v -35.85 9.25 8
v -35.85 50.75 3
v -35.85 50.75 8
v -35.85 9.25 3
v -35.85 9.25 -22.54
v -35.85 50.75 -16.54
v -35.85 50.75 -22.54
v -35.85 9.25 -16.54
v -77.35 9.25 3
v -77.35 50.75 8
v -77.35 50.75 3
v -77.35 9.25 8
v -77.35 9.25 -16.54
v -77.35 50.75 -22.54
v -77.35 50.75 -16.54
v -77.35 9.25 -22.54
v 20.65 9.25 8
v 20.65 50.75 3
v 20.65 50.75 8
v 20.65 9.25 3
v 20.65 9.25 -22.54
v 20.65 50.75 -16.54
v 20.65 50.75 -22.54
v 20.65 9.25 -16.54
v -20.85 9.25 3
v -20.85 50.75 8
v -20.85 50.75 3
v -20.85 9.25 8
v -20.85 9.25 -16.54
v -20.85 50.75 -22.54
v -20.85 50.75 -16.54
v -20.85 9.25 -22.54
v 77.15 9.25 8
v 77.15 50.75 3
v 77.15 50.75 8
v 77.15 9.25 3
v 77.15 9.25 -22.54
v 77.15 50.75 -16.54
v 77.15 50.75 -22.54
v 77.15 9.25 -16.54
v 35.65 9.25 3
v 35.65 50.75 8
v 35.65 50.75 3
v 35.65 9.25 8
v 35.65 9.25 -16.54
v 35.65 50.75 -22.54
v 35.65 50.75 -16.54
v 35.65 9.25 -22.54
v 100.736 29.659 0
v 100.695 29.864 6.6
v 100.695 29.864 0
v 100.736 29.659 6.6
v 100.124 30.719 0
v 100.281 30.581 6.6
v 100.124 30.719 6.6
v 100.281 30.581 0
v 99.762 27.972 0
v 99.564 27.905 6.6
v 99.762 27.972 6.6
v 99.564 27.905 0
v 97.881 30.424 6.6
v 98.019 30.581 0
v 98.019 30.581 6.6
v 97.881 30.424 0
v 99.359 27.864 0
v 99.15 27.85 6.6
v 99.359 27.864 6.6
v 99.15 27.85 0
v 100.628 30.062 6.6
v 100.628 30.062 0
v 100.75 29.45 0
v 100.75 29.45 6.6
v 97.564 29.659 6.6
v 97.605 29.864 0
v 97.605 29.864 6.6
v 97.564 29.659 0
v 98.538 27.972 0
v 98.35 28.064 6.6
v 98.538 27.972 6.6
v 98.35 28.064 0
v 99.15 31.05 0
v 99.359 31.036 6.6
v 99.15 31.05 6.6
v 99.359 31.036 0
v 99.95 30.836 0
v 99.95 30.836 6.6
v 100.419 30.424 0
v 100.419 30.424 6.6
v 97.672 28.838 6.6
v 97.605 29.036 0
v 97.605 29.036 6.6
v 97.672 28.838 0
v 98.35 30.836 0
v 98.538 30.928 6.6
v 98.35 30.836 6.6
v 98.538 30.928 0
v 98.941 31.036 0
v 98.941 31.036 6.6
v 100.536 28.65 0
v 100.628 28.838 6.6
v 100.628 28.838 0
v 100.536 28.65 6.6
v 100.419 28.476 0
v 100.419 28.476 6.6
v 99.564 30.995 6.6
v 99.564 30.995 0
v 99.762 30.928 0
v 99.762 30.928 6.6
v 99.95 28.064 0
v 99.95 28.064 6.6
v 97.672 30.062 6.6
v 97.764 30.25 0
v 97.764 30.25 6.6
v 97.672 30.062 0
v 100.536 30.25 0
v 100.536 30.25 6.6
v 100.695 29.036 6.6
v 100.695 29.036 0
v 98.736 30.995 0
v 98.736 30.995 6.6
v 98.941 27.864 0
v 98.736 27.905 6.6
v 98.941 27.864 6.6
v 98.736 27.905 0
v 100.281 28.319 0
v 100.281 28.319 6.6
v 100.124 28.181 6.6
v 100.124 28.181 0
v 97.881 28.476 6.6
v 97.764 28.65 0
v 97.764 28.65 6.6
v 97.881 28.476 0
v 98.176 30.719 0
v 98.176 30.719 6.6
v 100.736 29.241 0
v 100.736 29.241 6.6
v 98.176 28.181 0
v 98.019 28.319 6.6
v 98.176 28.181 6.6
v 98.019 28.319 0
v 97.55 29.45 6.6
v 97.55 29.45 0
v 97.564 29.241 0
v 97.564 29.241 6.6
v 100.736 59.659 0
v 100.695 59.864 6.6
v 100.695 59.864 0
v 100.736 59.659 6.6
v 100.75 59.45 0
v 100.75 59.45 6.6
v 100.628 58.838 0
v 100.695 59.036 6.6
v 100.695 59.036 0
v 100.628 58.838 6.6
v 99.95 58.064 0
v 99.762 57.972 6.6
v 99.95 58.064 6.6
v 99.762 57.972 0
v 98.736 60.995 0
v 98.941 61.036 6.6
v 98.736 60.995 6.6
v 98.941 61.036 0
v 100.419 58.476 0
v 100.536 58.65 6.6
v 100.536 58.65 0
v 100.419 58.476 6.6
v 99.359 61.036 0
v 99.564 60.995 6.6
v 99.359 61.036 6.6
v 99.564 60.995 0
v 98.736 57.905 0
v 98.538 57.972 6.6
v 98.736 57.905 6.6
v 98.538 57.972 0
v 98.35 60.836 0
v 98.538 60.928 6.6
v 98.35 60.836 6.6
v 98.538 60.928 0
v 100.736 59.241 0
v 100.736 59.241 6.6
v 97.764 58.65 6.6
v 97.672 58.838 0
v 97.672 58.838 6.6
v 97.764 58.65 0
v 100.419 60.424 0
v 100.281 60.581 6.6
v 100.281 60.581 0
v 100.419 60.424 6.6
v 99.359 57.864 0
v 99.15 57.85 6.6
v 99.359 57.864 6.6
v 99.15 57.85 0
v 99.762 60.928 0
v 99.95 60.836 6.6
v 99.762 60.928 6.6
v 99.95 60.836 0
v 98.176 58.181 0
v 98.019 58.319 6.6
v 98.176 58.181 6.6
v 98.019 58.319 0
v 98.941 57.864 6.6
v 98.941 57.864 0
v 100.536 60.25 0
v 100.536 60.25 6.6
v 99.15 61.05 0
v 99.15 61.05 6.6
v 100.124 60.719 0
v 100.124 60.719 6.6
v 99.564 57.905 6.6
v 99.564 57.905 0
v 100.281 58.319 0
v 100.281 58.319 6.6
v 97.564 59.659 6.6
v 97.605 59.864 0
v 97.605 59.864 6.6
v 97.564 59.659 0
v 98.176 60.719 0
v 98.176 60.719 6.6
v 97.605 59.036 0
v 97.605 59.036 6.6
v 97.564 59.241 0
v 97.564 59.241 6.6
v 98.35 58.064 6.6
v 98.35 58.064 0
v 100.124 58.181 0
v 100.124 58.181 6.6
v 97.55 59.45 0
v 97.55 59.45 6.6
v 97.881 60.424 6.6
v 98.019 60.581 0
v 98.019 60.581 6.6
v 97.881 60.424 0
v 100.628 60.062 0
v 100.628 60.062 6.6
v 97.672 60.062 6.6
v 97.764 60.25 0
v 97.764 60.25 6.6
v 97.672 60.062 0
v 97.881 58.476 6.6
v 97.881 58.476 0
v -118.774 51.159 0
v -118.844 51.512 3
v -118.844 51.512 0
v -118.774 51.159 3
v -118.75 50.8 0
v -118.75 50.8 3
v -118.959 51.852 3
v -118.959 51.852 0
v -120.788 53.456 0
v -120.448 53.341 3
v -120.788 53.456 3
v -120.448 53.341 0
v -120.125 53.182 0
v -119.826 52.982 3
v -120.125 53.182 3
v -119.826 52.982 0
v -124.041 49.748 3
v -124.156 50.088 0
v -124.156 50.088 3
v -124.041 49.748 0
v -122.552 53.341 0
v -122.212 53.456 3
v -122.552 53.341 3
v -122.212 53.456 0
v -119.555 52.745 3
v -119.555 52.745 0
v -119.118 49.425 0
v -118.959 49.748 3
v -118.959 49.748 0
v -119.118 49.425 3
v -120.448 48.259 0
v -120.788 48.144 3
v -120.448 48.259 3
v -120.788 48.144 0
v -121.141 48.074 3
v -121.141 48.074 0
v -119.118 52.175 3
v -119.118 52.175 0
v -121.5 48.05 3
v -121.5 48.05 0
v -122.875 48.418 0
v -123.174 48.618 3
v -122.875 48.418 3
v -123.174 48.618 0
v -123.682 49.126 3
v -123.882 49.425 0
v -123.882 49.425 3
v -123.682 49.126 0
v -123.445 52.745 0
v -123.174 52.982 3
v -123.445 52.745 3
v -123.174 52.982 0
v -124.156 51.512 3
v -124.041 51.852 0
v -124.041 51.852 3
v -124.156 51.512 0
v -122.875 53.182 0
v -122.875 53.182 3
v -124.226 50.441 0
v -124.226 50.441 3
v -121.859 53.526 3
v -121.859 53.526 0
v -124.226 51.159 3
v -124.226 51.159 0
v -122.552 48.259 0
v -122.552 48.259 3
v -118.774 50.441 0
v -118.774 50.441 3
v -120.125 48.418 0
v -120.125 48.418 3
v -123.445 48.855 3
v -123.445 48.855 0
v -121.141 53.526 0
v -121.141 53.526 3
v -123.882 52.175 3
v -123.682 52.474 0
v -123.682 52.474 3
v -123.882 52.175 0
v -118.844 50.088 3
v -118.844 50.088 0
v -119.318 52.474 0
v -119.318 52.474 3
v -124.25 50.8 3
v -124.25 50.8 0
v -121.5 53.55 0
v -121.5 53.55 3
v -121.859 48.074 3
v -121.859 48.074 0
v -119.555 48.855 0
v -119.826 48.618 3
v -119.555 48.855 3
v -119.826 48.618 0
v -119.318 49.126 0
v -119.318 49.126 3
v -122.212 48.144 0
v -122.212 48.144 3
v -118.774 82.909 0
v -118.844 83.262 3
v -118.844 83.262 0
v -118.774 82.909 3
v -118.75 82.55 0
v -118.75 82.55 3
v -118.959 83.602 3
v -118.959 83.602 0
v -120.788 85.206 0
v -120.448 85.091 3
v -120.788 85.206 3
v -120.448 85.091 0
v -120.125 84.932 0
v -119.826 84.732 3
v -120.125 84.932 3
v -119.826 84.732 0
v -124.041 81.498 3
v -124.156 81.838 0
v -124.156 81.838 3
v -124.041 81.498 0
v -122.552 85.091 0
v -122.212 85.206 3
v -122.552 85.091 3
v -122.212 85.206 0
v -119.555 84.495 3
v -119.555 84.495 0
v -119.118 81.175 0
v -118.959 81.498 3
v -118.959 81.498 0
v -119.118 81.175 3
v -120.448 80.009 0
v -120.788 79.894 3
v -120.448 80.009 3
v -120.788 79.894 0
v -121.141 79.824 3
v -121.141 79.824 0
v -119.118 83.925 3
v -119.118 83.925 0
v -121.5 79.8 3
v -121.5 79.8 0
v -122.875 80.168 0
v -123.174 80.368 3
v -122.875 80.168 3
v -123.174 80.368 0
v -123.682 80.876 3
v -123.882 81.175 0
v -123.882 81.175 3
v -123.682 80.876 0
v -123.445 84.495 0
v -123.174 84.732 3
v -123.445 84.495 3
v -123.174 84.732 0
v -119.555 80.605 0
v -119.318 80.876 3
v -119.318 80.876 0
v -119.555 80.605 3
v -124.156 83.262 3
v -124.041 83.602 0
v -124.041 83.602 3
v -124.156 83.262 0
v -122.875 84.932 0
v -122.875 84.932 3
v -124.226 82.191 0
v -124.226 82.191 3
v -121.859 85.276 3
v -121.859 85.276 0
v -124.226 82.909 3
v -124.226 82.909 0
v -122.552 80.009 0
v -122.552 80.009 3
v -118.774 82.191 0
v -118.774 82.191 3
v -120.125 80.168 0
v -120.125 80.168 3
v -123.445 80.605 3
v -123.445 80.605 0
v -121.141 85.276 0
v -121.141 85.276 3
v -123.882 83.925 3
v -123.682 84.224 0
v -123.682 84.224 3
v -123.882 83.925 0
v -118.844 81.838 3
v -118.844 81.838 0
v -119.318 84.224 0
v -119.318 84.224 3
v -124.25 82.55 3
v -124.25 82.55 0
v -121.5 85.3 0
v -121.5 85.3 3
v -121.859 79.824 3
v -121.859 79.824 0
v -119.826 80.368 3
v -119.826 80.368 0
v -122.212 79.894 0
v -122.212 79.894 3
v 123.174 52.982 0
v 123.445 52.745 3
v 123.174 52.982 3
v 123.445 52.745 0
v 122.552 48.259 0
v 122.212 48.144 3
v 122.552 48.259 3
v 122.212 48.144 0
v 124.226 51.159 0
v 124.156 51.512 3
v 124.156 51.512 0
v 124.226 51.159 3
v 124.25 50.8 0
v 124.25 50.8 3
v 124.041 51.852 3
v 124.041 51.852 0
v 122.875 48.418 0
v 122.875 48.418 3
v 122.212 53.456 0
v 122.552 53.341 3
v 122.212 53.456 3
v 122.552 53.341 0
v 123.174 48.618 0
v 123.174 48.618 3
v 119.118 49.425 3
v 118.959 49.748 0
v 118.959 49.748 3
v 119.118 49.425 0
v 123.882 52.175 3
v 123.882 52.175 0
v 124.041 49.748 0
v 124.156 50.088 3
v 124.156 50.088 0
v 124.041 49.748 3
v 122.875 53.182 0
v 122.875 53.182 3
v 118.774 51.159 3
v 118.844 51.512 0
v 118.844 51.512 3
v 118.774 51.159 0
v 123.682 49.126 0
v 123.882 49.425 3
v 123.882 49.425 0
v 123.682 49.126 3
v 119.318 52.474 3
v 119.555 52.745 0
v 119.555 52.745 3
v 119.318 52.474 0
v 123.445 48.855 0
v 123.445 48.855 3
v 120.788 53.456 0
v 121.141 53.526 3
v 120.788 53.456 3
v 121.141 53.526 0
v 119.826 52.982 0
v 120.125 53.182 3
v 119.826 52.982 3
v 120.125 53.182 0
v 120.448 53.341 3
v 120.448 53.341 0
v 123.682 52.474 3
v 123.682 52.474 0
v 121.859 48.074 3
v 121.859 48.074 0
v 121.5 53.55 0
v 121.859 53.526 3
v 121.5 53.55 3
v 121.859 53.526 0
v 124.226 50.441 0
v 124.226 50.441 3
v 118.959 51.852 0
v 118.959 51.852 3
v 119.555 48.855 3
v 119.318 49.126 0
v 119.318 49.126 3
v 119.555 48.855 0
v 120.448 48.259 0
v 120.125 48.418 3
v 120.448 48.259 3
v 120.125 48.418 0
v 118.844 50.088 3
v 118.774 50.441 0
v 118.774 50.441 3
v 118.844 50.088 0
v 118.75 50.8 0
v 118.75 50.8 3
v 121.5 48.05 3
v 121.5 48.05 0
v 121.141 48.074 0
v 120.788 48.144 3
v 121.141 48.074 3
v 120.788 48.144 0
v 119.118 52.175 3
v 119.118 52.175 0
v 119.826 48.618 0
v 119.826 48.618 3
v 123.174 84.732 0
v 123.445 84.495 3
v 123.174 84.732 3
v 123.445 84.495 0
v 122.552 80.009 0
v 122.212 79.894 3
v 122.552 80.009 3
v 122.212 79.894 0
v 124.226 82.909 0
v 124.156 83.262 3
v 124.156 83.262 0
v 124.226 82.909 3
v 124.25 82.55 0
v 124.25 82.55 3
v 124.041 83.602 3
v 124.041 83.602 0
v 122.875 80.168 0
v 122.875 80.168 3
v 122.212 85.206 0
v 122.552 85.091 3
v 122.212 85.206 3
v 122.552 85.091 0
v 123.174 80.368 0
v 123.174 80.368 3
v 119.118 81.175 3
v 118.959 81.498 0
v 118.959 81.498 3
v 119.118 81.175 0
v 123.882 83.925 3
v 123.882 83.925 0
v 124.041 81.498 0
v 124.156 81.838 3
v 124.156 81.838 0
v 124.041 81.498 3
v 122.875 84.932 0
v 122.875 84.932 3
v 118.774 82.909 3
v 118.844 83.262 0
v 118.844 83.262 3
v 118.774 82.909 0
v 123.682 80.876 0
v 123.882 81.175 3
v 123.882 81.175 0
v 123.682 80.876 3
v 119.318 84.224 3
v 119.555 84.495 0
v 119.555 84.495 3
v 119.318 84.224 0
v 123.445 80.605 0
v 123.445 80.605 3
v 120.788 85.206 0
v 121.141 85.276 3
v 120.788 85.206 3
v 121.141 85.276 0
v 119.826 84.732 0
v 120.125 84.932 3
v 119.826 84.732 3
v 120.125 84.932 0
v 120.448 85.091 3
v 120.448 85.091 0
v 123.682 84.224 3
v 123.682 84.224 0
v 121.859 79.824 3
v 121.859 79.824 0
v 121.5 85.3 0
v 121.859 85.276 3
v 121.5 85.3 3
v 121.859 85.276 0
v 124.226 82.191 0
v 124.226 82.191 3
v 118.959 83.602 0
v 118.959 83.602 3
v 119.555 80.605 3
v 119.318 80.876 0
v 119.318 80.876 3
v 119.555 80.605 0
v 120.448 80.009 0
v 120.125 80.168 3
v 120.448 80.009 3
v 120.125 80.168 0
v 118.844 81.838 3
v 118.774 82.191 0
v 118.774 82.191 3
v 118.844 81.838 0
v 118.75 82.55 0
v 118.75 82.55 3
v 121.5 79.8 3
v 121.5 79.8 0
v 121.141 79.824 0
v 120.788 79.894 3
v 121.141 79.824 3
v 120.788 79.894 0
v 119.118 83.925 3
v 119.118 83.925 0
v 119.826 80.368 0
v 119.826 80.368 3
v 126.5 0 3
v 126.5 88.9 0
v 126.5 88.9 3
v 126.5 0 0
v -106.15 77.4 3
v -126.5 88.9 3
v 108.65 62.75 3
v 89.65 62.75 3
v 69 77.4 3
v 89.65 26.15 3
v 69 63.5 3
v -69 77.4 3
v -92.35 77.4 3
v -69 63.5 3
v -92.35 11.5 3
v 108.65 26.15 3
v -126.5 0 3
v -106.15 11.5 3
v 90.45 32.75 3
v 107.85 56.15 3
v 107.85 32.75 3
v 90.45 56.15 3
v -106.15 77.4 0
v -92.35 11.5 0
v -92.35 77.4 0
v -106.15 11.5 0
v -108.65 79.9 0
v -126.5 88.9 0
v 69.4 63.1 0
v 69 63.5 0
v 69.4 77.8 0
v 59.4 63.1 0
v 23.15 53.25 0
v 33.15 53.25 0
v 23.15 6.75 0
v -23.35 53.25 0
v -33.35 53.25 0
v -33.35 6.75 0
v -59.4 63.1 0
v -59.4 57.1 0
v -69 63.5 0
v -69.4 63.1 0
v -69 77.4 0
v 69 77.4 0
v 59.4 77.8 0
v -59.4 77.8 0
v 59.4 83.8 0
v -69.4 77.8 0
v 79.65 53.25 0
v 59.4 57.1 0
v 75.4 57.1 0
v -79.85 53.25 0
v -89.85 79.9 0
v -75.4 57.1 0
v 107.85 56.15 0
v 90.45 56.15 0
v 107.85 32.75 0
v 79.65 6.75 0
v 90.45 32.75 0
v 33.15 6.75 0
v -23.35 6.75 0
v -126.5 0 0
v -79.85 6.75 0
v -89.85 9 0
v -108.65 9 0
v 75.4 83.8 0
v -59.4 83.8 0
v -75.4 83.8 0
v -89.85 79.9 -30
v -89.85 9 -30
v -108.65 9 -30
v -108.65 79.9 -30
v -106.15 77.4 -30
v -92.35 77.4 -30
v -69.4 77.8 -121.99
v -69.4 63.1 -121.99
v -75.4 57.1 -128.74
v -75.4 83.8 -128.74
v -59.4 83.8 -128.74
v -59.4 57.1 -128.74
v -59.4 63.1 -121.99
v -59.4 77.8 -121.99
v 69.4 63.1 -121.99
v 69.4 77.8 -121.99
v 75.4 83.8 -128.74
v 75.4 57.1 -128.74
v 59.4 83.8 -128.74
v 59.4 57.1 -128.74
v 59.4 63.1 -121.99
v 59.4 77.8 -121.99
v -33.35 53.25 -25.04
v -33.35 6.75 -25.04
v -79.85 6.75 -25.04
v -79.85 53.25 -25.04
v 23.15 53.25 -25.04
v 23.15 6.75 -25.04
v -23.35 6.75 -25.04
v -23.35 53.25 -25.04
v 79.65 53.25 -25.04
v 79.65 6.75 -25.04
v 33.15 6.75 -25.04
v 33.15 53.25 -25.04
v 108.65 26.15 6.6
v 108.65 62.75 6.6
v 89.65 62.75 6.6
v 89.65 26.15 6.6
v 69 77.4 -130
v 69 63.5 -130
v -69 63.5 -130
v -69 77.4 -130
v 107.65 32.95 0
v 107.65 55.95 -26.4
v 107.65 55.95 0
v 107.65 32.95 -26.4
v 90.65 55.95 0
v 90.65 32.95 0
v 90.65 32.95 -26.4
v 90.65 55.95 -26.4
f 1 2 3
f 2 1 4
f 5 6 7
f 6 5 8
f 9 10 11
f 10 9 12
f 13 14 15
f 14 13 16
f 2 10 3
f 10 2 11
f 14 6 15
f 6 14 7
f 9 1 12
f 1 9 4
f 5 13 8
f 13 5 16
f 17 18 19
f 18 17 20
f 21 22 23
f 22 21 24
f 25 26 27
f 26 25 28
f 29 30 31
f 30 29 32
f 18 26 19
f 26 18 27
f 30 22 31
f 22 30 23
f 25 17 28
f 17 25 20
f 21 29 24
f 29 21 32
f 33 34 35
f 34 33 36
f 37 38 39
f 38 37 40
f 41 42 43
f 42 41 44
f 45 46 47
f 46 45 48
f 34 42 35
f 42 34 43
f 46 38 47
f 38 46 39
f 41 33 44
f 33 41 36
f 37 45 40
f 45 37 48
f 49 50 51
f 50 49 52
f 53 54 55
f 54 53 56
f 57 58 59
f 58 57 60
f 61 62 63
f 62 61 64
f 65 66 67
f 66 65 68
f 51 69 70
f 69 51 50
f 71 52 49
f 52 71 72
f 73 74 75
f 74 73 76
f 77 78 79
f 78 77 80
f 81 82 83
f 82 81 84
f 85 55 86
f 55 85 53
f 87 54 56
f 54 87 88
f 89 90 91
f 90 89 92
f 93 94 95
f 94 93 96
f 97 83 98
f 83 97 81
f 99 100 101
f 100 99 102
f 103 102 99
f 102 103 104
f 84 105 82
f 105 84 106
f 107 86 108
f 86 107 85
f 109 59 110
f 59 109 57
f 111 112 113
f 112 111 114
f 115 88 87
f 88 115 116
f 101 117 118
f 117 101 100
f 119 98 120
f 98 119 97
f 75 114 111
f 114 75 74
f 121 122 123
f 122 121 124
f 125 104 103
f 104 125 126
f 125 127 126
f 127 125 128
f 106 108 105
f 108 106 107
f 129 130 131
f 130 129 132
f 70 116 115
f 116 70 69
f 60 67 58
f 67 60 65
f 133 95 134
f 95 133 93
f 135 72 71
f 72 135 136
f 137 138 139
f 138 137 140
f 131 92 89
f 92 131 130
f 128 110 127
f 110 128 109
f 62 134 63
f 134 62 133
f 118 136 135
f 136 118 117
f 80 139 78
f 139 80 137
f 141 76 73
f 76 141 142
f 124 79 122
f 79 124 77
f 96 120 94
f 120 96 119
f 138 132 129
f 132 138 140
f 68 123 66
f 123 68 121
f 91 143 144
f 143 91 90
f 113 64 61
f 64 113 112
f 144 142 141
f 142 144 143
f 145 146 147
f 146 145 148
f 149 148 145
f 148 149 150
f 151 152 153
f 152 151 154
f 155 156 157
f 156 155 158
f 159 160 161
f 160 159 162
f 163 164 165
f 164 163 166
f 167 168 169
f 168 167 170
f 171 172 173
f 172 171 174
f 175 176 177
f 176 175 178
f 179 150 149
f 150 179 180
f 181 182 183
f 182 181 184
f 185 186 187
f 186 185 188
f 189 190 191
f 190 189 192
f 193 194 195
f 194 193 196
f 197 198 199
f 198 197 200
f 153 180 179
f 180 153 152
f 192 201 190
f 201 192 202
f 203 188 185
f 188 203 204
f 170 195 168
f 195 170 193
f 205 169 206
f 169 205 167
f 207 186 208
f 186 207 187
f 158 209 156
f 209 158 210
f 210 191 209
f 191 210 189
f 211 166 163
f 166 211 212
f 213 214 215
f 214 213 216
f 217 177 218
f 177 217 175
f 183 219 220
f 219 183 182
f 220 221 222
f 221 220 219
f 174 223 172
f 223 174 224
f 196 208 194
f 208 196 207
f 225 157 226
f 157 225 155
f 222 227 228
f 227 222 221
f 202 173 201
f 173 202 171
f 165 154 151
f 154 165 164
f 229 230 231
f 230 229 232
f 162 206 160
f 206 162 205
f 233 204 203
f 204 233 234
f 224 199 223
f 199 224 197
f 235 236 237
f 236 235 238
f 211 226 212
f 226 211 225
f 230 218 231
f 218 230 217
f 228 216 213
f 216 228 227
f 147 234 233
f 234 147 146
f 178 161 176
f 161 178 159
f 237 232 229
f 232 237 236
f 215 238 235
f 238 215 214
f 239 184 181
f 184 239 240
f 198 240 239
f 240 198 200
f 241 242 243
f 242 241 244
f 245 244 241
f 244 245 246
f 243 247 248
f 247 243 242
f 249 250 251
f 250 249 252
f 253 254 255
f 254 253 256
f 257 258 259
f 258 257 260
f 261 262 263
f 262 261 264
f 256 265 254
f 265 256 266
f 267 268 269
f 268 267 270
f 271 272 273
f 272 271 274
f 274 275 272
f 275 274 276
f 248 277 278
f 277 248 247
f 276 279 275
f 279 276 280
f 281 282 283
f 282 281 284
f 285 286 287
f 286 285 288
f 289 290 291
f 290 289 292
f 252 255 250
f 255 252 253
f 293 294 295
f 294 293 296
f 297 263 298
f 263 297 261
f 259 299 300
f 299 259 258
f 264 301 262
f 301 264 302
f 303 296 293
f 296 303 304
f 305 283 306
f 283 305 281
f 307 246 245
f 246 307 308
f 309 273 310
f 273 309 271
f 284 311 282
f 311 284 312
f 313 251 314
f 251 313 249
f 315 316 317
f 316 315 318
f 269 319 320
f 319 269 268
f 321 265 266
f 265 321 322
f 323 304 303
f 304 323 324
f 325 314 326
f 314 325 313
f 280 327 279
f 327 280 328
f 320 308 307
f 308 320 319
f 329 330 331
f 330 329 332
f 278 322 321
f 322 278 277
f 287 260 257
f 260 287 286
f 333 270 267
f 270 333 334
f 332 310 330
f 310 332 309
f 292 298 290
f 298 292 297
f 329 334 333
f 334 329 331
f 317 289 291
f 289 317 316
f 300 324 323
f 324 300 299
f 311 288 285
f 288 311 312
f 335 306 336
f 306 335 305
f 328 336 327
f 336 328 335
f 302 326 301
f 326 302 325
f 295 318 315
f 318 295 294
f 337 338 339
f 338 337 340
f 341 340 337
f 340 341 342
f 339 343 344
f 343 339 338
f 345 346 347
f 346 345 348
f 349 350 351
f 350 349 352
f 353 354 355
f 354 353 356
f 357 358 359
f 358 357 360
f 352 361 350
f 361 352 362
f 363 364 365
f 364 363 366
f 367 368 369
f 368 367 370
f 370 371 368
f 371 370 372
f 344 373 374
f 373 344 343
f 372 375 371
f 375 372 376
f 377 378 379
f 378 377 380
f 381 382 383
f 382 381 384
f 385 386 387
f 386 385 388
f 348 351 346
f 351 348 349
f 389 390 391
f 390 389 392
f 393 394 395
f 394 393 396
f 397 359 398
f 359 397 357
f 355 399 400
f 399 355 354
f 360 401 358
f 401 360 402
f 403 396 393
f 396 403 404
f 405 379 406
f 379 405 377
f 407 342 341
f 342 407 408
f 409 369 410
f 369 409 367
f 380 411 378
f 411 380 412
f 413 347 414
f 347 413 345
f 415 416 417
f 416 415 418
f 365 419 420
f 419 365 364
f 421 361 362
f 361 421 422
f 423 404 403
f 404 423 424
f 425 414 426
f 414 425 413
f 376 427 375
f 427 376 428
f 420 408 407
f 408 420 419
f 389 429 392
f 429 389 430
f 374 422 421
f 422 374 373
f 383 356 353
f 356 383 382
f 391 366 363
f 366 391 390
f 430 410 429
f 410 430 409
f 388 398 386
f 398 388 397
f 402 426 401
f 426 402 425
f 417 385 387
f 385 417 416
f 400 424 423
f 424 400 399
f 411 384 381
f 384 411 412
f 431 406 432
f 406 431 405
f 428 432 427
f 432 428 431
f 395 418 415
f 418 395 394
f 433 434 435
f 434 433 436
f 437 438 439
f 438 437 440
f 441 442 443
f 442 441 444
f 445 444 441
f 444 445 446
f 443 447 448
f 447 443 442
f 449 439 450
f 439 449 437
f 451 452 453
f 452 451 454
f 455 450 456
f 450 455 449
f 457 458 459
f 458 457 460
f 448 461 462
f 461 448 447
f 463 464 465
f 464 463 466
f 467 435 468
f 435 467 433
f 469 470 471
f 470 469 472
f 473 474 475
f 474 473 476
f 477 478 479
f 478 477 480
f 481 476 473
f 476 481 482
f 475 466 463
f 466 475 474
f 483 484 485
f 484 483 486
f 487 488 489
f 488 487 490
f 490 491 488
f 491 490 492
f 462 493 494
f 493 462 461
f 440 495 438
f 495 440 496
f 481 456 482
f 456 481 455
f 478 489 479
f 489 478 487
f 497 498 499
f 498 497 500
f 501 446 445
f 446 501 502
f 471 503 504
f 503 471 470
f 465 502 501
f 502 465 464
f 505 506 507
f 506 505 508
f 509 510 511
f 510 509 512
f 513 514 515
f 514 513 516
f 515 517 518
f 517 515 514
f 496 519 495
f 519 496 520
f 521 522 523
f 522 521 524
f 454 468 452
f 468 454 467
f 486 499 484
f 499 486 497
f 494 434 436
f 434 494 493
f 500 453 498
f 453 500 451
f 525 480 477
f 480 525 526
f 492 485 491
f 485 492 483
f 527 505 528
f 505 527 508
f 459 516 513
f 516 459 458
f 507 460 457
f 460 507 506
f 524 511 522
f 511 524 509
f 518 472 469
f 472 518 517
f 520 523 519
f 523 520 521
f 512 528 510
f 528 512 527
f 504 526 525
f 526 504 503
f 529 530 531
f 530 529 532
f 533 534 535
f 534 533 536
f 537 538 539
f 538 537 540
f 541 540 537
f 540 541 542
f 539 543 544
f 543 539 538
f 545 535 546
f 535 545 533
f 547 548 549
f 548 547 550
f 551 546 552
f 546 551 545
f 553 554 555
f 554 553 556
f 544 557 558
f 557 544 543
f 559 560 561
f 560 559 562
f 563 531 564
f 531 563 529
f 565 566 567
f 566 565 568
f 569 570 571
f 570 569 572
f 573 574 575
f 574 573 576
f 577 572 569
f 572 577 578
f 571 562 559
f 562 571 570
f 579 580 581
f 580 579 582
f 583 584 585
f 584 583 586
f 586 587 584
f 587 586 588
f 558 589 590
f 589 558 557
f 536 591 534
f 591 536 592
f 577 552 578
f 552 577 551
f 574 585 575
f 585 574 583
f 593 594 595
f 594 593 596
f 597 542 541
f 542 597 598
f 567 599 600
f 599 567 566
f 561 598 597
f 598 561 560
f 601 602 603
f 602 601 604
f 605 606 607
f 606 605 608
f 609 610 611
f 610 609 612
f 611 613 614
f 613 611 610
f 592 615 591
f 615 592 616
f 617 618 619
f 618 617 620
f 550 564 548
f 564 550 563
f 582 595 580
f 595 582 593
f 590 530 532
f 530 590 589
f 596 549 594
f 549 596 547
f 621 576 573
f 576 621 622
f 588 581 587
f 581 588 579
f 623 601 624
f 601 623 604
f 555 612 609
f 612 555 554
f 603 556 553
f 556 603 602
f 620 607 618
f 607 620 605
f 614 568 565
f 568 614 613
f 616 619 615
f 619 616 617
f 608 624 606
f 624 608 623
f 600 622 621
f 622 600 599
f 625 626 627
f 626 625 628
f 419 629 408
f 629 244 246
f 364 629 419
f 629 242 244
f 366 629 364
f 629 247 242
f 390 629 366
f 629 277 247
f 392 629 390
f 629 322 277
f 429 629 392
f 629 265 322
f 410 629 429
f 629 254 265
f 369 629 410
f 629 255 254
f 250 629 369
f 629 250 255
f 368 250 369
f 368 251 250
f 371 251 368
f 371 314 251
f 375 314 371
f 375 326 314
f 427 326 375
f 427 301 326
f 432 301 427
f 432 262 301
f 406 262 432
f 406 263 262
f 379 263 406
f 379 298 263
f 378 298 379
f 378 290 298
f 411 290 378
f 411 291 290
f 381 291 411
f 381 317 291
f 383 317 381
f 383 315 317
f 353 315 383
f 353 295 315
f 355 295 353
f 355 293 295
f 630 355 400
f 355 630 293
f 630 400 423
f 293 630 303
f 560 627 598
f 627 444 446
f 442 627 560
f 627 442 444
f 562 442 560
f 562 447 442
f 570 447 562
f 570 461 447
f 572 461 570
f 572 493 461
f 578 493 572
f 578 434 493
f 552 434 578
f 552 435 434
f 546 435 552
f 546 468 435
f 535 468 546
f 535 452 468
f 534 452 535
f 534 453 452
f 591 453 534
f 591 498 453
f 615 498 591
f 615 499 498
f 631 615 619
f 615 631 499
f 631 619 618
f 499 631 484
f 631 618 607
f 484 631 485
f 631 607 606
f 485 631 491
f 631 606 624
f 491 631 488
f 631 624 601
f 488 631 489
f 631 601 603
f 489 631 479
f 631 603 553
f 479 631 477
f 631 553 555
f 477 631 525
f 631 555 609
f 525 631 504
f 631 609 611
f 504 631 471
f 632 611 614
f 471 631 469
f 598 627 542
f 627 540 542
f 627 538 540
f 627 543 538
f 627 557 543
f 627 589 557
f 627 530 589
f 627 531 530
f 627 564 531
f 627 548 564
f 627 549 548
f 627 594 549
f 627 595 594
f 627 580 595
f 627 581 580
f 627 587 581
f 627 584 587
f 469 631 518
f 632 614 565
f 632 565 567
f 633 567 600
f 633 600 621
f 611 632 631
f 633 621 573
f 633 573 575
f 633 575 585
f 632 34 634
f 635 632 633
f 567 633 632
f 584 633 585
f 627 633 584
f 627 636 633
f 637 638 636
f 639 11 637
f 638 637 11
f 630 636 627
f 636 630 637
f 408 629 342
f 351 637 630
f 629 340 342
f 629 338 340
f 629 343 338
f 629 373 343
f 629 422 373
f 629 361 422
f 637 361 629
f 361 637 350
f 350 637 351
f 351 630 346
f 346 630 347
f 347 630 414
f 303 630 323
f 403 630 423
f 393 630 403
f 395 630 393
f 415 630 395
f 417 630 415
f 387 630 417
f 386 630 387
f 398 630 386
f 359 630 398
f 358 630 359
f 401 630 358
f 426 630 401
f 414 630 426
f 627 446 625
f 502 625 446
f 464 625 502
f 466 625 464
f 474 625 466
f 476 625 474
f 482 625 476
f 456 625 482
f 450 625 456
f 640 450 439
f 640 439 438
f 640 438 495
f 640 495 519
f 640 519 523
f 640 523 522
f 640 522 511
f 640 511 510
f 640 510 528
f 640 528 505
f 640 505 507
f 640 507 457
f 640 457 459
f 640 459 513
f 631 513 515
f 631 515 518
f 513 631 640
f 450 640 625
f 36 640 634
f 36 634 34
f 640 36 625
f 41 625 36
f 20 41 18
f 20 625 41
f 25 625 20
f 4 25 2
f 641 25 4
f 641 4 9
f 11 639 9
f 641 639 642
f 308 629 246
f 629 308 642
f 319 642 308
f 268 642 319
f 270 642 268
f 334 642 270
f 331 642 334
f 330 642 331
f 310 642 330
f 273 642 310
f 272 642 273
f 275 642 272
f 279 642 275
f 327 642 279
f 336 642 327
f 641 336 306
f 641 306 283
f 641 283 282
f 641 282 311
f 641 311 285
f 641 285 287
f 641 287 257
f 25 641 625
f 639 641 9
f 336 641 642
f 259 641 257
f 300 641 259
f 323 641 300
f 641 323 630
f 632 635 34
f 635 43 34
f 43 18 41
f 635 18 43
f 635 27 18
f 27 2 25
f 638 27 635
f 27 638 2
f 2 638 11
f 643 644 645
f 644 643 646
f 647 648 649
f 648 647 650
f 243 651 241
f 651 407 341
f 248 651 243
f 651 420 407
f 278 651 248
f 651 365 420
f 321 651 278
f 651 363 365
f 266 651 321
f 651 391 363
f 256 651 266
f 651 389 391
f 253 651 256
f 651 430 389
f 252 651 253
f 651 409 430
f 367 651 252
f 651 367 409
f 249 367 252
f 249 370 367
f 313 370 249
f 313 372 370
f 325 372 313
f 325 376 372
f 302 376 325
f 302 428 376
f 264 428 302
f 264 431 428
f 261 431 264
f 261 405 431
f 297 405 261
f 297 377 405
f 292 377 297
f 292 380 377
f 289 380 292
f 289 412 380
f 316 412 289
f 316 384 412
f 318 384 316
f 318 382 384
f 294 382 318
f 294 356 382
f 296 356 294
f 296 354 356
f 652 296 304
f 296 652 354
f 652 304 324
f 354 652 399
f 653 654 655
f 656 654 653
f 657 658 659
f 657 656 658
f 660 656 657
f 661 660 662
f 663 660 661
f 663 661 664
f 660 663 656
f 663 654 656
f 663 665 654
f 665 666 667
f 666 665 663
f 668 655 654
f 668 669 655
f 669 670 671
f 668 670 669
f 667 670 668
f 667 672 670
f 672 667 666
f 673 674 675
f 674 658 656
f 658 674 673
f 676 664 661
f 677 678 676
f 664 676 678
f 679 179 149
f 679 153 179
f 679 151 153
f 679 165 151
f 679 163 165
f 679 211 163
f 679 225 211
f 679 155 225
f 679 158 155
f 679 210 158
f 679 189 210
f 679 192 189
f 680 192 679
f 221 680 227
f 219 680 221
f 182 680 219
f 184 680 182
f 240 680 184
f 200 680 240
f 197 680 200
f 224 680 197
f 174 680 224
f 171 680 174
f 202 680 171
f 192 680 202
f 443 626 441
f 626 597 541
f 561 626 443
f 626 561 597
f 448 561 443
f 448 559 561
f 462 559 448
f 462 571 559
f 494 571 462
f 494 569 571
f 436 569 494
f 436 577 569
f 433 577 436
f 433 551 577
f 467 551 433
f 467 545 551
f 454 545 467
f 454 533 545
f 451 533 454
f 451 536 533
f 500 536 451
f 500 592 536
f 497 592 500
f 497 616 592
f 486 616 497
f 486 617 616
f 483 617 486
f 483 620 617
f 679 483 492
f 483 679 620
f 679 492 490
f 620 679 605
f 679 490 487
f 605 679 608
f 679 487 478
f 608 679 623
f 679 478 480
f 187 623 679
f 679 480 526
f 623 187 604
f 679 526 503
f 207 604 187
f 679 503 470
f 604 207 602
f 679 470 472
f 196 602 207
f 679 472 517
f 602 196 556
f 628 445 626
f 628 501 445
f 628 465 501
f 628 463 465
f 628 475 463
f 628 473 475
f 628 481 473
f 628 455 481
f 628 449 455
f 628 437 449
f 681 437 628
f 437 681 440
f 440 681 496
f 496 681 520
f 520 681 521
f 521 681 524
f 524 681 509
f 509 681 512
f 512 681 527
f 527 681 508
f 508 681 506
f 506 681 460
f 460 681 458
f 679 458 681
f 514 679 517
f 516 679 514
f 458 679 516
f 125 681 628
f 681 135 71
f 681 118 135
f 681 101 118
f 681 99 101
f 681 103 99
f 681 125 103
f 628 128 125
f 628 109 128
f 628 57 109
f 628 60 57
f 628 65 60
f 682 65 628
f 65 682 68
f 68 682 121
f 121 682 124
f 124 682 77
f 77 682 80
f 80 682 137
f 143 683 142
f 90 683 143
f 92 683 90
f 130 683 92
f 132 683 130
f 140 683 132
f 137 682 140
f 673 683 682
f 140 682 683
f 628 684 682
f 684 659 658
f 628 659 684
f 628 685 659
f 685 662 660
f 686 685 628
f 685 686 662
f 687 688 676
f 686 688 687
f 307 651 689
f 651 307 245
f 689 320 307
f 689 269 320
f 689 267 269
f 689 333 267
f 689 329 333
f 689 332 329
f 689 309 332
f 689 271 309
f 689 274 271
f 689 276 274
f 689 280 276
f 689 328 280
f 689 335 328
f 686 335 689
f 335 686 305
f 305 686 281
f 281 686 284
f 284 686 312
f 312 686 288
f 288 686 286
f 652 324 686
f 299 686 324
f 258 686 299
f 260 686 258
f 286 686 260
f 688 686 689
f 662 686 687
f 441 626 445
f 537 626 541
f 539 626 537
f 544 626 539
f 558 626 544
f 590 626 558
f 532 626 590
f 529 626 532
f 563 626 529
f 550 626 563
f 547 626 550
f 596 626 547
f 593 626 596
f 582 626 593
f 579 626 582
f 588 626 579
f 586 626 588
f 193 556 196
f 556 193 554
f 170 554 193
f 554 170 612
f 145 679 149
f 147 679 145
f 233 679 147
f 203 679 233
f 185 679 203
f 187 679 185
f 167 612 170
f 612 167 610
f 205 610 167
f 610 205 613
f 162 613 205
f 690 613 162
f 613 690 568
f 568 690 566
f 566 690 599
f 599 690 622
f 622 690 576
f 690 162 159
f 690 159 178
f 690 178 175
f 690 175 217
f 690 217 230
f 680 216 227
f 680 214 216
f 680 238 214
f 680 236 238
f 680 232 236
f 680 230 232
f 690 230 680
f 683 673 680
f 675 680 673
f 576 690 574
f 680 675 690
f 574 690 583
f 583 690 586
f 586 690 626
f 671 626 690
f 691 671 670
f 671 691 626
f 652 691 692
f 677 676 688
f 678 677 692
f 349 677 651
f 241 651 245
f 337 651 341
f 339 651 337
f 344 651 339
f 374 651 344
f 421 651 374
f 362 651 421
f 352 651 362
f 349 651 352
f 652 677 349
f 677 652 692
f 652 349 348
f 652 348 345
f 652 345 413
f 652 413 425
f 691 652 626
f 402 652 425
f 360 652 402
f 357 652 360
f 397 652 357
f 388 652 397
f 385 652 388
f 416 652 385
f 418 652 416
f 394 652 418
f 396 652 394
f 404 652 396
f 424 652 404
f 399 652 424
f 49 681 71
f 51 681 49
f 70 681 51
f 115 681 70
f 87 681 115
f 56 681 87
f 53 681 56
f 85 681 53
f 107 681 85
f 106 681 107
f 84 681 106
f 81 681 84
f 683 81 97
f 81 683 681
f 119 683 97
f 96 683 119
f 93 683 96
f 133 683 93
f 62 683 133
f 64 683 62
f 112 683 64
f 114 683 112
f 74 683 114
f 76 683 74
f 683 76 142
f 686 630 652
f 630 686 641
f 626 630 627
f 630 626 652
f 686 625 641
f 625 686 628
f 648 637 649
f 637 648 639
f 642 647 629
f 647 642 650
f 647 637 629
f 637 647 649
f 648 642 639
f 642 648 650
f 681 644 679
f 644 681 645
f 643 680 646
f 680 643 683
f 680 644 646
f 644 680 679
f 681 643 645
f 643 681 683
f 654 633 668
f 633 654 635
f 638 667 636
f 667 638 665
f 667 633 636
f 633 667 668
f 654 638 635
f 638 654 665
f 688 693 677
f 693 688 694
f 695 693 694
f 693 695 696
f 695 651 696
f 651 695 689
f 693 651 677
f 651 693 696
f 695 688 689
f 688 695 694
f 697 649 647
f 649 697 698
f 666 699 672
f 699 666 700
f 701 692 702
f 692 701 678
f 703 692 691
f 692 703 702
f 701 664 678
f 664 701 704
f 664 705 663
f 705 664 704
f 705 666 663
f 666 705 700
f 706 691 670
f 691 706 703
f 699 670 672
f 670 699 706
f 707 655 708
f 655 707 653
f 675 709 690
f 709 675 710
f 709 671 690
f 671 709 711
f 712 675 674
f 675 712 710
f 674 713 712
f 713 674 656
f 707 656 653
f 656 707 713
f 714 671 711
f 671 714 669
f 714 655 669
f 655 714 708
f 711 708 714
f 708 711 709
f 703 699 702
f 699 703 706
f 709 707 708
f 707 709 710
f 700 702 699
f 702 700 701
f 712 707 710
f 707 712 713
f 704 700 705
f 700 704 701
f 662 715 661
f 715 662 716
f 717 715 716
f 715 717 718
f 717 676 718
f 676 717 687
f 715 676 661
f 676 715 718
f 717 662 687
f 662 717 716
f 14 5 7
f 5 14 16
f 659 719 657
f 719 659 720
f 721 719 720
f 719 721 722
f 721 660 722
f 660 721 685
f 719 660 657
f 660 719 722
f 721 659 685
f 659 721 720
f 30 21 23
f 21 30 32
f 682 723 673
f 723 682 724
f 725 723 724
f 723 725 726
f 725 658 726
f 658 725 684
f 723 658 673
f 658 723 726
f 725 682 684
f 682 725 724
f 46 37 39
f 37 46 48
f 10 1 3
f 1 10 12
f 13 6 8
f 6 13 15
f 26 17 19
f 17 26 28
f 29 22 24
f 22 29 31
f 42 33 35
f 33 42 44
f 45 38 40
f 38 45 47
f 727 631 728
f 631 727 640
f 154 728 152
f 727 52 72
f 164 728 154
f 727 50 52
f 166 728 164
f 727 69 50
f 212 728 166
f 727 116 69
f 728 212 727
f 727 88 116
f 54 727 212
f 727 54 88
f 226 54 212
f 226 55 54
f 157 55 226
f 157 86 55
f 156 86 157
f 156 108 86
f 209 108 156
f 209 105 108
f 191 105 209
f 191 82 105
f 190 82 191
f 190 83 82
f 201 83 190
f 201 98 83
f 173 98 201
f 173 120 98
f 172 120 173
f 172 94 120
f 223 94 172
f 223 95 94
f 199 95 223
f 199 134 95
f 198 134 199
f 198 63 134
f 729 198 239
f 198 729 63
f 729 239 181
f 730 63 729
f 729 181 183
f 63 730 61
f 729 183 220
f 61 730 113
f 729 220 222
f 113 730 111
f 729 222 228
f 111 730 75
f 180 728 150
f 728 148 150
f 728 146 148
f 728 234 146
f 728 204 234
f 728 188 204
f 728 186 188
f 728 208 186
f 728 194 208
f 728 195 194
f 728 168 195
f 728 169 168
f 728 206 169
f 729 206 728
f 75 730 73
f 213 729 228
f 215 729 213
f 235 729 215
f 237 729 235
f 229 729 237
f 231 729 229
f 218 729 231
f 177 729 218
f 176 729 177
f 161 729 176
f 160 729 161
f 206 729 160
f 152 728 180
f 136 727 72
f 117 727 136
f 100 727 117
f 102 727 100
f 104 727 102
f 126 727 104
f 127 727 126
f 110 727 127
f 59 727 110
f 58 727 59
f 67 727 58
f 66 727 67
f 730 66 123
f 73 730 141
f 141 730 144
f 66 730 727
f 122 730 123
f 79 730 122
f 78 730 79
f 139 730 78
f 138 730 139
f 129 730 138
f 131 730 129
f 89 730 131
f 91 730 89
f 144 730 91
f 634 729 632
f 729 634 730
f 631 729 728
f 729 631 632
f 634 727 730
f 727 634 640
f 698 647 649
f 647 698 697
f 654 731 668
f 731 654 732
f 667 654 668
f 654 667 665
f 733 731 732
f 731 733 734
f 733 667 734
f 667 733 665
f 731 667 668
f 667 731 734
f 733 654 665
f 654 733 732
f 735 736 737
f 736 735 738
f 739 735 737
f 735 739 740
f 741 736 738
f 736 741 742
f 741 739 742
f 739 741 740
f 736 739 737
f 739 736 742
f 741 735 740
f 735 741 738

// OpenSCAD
// =============================================================================
// CONSOLE10 — Aux Faceplate  v0.4  (2U: CF + Blu-ray + 3 SD + USB-C)
//
// Regular 2U flat 3 mm faceplate that bolts to the cheek SLANT inserts.
// Hosts: CF reader (left), a slot-load Blu-ray drive (center, with side rails
// reaching back), the 3 SD-card holders relocated UNDER the Blu-ray slot, and a
// USB-C panel mount (right). (2026-06-02 edits.)
//
// Split off from the 3U LCD-hole faceplate on 2026-05-30. See
// `Console10_interface_specs.md` for the canonical device dimensions.
// =============================================================================

// ---------- module geometry the plate must mate to ----------
panel_width   = 253;
cheek_thick   = 10;
slant_angle   = 30;
U             = 44.45;
interior_half = panel_width/2 - cheek_thick;   // 116.5
cheek_ctr_x   = interior_half + cheek_thick/2; // 121.5

// ---------- flat plate ----------
n_u      = 2;             // 2U faceplate
plate_w  = 253;
plate_h  = n_u * U;       // 88.9
plate_t  = 3;

// ---------- CF reader (press-fit, full-depth open sleeve) ----------
cf_w         = 13.8;
cf_h         = 65.9;
cf_d         = 30;
cf_press_clr = 0;
cf_wall_t    = 2.5;
cf_cx        = -99.25;     // shifted left so 3 holders + USB-C fit symmetrically
cf_cy        = plate_h/2;

// ---------- SD card holder (press-fit, closed-back sleeve, sits proud) ----
holder_w         = 41.5;
holder_h         = 41.5;
holder_d         = 24.54;
holder_press_clr = 0;
holder_wall_t    = 2.5;
holder_proud     = 5;
holder_sleeve_extra_d = 6;
holder_sleeve_d  = (holder_d - plate_t - holder_proud) + holder_wall_t + holder_sleeve_extra_d;

// ---------- USB-C panel mount (QIANRENON rectangular, screw-mounted, proud) ----
usbc_body_w         = 17;
usbc_body_h         = 23;
usbc_body_d         = 26.4;
usbc_flange_w       = 19;
usbc_flange_h       = 36.6;
usbc_flange_t       = 3.6;
usbc_screw_d        = 3.2;
usbc_screw_y_pitch  = 30;
usbc_body_clr       = 0.2;

// ---------- horizontal layout ----------
// Devices left-to-right: CF, holder1, holder2, holder3, USB-C. 3 holders
// grouped consecutively; USB-C anchors the far right. Each device's outer
// footprint separated from the next by panel_layout_gap. Layout symmetric
// around X=0 (cf_cx chosen to balance).
panel_layout_gap = 10;
holder_cy = 30;   // lowered UNDER the Blu-ray drive, clear of its side rails (was plate_h/2)

// Half-widths used in chain math
_cf_half     = (cf_w - 2*cf_press_clr)/2 + cf_wall_t;            //  9.4
_holder_half = (holder_w - 2*holder_press_clr)/2 + holder_wall_t; // 23.25

holder1_cx = cf_cx + _cf_half + panel_layout_gap + _holder_half;
holder2_cx = holder1_cx + 2*_holder_half + panel_layout_gap;
holder3_cx = holder2_cx + 2*_holder_half + panel_layout_gap;
usbc_cx    = holder3_cx + _holder_half + panel_layout_gap + usbc_flange_w/2;
usbc_cy    = plate_h/2;

// All holder X centers (loop over this in panel/mocks)
holder_cxs = [holder1_cx, holder2_cx, holder3_cx];

// ---------- slant-insert mount holes ----------
// 2U plate: only U0-row cheek holes fit (50.80, 66.675, 82.55).
// Wide pair = 50.80 + 82.55 → 31.75 mm vertical grip.
mount_y      = [50.80, 82.55];
m10_32_clear = 5.5;

// ---------- Blu-ray disc slot (added 2026-06-02) ----------
// Slot-loading Blu-ray drive. This opening is the disc slot; TOP edge aligned
// with the top of the CF (media) reader slot. Centered on the plate in X (no X
// spec was given).
slot_w   = 138;
slot_h   = 13.9;
slot_d   = 100;                   // also the support-rail length back behind the face
slot_cx  = 0;
slot_top = cf_cy + cf_h/2;        // top of the CF reader slot = 77.4
slot_cy  = slot_top - slot_h/2;   // 70.45

// ---------- Blu-ray support rails (added 2026-06-02) ----------
// SIDE rails that wrap the drive's LEFT & RIGHT edges — a C-channel per side
// (side wall + top & bottom lips), full bd_rail_len deep down the side; the
// lips encroach only bd_wrap in from each side. No tray/floor; middle open.
// Defaults to the slot footprint — SET bd_body_w/h to the measured drive body.
bd_body_w   = slot_w;             // drive body width  (TODO: measure the drive)
bd_body_h   = slot_h;             // drive body height (TODO: measure the drive)
bd_body_d   = 130;                // drive full depth
bd_rail_len = bd_body_d;          // side rails run the full drive depth
bd_wrap     = 10;                 // lip encroachment in from each side
bd_rail_t   = 6;                  // side-wall / lip thickness (doubled from 3)
bd_lead     = 8;                  // lead-in chamfer length at the back mouth
bd_clr      = 0.4;                // slide clearance per side

show_on_slant = false;
show_devices  = true;
floor_t       = 6;

$fn = 48;

echo(str("AUX FACEPLATE v0.4 (2U: CF + Blu-ray + 3 SD + USB-C) ", plate_w, " x ", plate_h, " (", n_u, "U) t", plate_t,
         " | CF @ x=", cf_cx,
         " | 3 SD @ y=", holder_cy, " x=", holder_cxs,
         " | USB-C @ x=", usbc_cx, " (cutout ", usbc_body_w + 2*usbc_body_clr, "x", usbc_body_h + 2*usbc_body_clr,
         ", screws Φ", usbc_screw_d, " @ y±", usbc_screw_y_pitch/2, ")",
         " | BLU-RAY SLOT ", slot_w, "x", slot_h, " @ x=", slot_cx, " top y=", slot_top,
         " + side rails wrap ", bd_wrap, " in, ", bd_rail_len, " deep, ", bd_lead, " lead-in"));

// =============================================================================
// CF SUPPORT SLEEVE — open both ends, wraps the CF reader full depth.
// =============================================================================
module cf_support_sleeve() {
    inner_w  = cf_w - 2*cf_press_clr;
    inner_h  = cf_h - 2*cf_press_clr;
    outer_w  = inner_w + 2*cf_wall_t;
    outer_h  = inner_h + 2*cf_wall_t;
    translate([cf_cx, cf_cy, -cf_d/2])
        difference() {
            cube([outer_w, outer_h, cf_d],     center = true);
            cube([inner_w, inner_h, cf_d + 2], center = true);
        }
}

// =============================================================================
// HOLDER SUPPORT SLEEVE — closed back (floor is the bottom-out stop).
// Takes a cx parameter so multiple holders can share the same module.
// =============================================================================
module holder_support_sleeve(cx) {
    inner_w   = holder_w - 2*holder_press_clr;
    inner_h   = holder_h - 2*holder_press_clr;
    outer_w   = inner_w + 2*holder_wall_t;
    outer_h   = inner_h + 2*holder_wall_t;
    cavity_d  = holder_sleeve_d - holder_wall_t;

    difference() {
        translate([cx - outer_w/2, holder_cy - outer_h/2, -holder_sleeve_d])
            cube([outer_w, outer_h, holder_sleeve_d]);
        translate([cx - inner_w/2, holder_cy - inner_h/2, -cavity_d])
            cube([inner_w, inner_h, cavity_d + 1]);
    }
}

// =============================================================================
// BLU-RAY SUPPORT RAILS — a C-channel down each SIDE that wraps the drive's
// left & right edges (side wall + top & bottom lips), full bd_rail_len deep.
// The lips reach bd_wrap in from each side; the middle is open.
// =============================================================================
module bluray_support_rails() {
    x_in     = bd_body_w/2 + bd_clr;            // drive side face (+ clearance)
    bottom_y = slot_cy - slot_h/2 - bd_clr;     // under the drive's bottom edge
    top_y    = slot_cy + slot_h/2 + bd_clr;     // over the drive's top edge
    module rail_L() {                            // left side rail; mirrored for right
        // side wall, outside the drive, spanning below the bottom lip to above the top lip
        translate([-x_in - bd_rail_t, bottom_y - bd_rail_t, -bd_rail_len])
            cube([bd_rail_t, (top_y - bottom_y) + 2*bd_rail_t, bd_rail_len]);
        // bottom lip — under the drive, encroaching bd_wrap in
        translate([-x_in, bottom_y - bd_rail_t, -bd_rail_len])
            cube([bd_wrap, bd_rail_t, bd_rail_len]);
        // top lip — over the drive, encroaching bd_wrap in
        translate([-x_in, top_y, -bd_rail_len])
            cube([bd_wrap, bd_rail_t, bd_rail_len]);
    }
    // lead-in funnel: flares the channel mouth (lip faces + side-wall inner) over
    // bd_lead at the back so the drive's edges feed into the rails.
    cy = (bottom_y + top_y) / 2;
    ch = top_y - bottom_y;
    cw = 2 * x_in;
    difference() {
        union() { rail_L(); mirror([1, 0, 0]) rail_L(); }
        hull() {
            translate([0, cy, -bd_rail_len + bd_lead]) cube([cw, ch, 0.02], center = true);
            translate([0, cy, -bd_rail_len - 1])       cube([cw + 2*bd_lead, ch + 2*bd_lead, 0.02], center = true);
        }
    }
}

// =============================================================================
// PANEL — flat 2U 3 mm slab + cutouts + rear sleeves.
// =============================================================================
module panel() {
    union() {
        difference() {
            translate([-plate_w/2, 0, 0]) cube([plate_w, plate_h, plate_t]);

            // CF reader press-fit cutout
            translate([cf_cx, cf_cy, plate_t/2])
                cube([cf_w - 2*cf_press_clr, cf_h - 2*cf_press_clr, plate_t + 2], center = true);

            // 3 SD card holder press-fit cutouts (under the Blu-ray drive)
            for (cx = holder_cxs)
                translate([cx, holder_cy, plate_t/2])
                    cube([holder_w - 2*holder_press_clr, holder_h - 2*holder_press_clr, plate_t + 2], center = true);

            // USB-C panel-mount: body cutout + 2 M3 screw holes
            translate([usbc_cx, usbc_cy, plate_t/2])
                cube([usbc_body_w + 2*usbc_body_clr, usbc_body_h + 2*usbc_body_clr, plate_t + 2], center = true);
            for (dy = [-1, 1])
                translate([usbc_cx, usbc_cy + dy*usbc_screw_y_pitch/2, -1])
                    cylinder(d = usbc_screw_d, h = plate_t + 2);

            // Wide top slot — 138 x 13.9, top edge aligned with the CF slot top,
            // cut slot_d deep (through the plate + rear clearance).
            translate([slot_cx, slot_cy, plate_t - slot_d/2])
                cube([slot_w, slot_h, slot_d + 2], center = true);

            // Slant-insert mount screws — 2 per side
            for (sx = [-cheek_ctr_x, cheek_ctr_x])
                for (y = mount_y)
                    translate([sx, y, -1]) cylinder(d = m10_32_clear, h = plate_t + 2);
        }

        cf_support_sleeve();
        bluray_support_rails();
        for (cx = holder_cxs) holder_support_sleeve(cx);
    }
}

// =============================================================================
// MOCKS — fit-check only.
// =============================================================================
module device_mocks() {
    color("SlateGray")
        translate([cf_cx, cf_cy, -cf_d/2])
            cube([cf_w, cf_h, cf_d], center = true);

    // 3 SD card holders (under the Blu-ray drive)
    for (cx = holder_cxs)
        color("Goldenrod")
            translate([cx, holder_cy, plate_t + holder_proud - holder_d/2])
                cube([holder_w, holder_h, holder_d], center = true);

    // Blu-ray drive body (slim slot-load) — fit-check mock, cradled in the rails
    color("DimGray")
        translate([slot_cx, (slot_cy - slot_h/2) + bd_body_h/2, -bd_rail_len/2])
            cube([bd_body_w, bd_body_h, bd_rail_len], center = true);

    color("Silver")
        difference() {
            translate([usbc_cx, usbc_cy, plate_t + usbc_flange_t/2])
                cube([usbc_flange_w, usbc_flange_h, usbc_flange_t], center = true);
            for (dy = [-1, 1])
                translate([usbc_cx, usbc_cy + dy*usbc_screw_y_pitch/2, plate_t - 1])
                    cylinder(d = usbc_screw_d, h = usbc_flange_t + 2);
        }
    color("DimGray")
        translate([usbc_cx, usbc_cy, -usbc_body_d/2])
            cube([usbc_body_w, usbc_body_h, usbc_body_d], center = true);
}

module aux_stack() {
    color("Gainsboro") panel();
    if (show_devices) device_mocks();
}

module aux_on_slant() {
    translate([0, 0, floor_t])
        rotate([90 - slant_angle, 0, 0])
            aux_stack();
}

// Public entry the module assembly calls:
module aux_2u_faceplate_on_slant() { aux_on_slant(); }

if (show_on_slant) aux_on_slant();
else               aux_stack();
